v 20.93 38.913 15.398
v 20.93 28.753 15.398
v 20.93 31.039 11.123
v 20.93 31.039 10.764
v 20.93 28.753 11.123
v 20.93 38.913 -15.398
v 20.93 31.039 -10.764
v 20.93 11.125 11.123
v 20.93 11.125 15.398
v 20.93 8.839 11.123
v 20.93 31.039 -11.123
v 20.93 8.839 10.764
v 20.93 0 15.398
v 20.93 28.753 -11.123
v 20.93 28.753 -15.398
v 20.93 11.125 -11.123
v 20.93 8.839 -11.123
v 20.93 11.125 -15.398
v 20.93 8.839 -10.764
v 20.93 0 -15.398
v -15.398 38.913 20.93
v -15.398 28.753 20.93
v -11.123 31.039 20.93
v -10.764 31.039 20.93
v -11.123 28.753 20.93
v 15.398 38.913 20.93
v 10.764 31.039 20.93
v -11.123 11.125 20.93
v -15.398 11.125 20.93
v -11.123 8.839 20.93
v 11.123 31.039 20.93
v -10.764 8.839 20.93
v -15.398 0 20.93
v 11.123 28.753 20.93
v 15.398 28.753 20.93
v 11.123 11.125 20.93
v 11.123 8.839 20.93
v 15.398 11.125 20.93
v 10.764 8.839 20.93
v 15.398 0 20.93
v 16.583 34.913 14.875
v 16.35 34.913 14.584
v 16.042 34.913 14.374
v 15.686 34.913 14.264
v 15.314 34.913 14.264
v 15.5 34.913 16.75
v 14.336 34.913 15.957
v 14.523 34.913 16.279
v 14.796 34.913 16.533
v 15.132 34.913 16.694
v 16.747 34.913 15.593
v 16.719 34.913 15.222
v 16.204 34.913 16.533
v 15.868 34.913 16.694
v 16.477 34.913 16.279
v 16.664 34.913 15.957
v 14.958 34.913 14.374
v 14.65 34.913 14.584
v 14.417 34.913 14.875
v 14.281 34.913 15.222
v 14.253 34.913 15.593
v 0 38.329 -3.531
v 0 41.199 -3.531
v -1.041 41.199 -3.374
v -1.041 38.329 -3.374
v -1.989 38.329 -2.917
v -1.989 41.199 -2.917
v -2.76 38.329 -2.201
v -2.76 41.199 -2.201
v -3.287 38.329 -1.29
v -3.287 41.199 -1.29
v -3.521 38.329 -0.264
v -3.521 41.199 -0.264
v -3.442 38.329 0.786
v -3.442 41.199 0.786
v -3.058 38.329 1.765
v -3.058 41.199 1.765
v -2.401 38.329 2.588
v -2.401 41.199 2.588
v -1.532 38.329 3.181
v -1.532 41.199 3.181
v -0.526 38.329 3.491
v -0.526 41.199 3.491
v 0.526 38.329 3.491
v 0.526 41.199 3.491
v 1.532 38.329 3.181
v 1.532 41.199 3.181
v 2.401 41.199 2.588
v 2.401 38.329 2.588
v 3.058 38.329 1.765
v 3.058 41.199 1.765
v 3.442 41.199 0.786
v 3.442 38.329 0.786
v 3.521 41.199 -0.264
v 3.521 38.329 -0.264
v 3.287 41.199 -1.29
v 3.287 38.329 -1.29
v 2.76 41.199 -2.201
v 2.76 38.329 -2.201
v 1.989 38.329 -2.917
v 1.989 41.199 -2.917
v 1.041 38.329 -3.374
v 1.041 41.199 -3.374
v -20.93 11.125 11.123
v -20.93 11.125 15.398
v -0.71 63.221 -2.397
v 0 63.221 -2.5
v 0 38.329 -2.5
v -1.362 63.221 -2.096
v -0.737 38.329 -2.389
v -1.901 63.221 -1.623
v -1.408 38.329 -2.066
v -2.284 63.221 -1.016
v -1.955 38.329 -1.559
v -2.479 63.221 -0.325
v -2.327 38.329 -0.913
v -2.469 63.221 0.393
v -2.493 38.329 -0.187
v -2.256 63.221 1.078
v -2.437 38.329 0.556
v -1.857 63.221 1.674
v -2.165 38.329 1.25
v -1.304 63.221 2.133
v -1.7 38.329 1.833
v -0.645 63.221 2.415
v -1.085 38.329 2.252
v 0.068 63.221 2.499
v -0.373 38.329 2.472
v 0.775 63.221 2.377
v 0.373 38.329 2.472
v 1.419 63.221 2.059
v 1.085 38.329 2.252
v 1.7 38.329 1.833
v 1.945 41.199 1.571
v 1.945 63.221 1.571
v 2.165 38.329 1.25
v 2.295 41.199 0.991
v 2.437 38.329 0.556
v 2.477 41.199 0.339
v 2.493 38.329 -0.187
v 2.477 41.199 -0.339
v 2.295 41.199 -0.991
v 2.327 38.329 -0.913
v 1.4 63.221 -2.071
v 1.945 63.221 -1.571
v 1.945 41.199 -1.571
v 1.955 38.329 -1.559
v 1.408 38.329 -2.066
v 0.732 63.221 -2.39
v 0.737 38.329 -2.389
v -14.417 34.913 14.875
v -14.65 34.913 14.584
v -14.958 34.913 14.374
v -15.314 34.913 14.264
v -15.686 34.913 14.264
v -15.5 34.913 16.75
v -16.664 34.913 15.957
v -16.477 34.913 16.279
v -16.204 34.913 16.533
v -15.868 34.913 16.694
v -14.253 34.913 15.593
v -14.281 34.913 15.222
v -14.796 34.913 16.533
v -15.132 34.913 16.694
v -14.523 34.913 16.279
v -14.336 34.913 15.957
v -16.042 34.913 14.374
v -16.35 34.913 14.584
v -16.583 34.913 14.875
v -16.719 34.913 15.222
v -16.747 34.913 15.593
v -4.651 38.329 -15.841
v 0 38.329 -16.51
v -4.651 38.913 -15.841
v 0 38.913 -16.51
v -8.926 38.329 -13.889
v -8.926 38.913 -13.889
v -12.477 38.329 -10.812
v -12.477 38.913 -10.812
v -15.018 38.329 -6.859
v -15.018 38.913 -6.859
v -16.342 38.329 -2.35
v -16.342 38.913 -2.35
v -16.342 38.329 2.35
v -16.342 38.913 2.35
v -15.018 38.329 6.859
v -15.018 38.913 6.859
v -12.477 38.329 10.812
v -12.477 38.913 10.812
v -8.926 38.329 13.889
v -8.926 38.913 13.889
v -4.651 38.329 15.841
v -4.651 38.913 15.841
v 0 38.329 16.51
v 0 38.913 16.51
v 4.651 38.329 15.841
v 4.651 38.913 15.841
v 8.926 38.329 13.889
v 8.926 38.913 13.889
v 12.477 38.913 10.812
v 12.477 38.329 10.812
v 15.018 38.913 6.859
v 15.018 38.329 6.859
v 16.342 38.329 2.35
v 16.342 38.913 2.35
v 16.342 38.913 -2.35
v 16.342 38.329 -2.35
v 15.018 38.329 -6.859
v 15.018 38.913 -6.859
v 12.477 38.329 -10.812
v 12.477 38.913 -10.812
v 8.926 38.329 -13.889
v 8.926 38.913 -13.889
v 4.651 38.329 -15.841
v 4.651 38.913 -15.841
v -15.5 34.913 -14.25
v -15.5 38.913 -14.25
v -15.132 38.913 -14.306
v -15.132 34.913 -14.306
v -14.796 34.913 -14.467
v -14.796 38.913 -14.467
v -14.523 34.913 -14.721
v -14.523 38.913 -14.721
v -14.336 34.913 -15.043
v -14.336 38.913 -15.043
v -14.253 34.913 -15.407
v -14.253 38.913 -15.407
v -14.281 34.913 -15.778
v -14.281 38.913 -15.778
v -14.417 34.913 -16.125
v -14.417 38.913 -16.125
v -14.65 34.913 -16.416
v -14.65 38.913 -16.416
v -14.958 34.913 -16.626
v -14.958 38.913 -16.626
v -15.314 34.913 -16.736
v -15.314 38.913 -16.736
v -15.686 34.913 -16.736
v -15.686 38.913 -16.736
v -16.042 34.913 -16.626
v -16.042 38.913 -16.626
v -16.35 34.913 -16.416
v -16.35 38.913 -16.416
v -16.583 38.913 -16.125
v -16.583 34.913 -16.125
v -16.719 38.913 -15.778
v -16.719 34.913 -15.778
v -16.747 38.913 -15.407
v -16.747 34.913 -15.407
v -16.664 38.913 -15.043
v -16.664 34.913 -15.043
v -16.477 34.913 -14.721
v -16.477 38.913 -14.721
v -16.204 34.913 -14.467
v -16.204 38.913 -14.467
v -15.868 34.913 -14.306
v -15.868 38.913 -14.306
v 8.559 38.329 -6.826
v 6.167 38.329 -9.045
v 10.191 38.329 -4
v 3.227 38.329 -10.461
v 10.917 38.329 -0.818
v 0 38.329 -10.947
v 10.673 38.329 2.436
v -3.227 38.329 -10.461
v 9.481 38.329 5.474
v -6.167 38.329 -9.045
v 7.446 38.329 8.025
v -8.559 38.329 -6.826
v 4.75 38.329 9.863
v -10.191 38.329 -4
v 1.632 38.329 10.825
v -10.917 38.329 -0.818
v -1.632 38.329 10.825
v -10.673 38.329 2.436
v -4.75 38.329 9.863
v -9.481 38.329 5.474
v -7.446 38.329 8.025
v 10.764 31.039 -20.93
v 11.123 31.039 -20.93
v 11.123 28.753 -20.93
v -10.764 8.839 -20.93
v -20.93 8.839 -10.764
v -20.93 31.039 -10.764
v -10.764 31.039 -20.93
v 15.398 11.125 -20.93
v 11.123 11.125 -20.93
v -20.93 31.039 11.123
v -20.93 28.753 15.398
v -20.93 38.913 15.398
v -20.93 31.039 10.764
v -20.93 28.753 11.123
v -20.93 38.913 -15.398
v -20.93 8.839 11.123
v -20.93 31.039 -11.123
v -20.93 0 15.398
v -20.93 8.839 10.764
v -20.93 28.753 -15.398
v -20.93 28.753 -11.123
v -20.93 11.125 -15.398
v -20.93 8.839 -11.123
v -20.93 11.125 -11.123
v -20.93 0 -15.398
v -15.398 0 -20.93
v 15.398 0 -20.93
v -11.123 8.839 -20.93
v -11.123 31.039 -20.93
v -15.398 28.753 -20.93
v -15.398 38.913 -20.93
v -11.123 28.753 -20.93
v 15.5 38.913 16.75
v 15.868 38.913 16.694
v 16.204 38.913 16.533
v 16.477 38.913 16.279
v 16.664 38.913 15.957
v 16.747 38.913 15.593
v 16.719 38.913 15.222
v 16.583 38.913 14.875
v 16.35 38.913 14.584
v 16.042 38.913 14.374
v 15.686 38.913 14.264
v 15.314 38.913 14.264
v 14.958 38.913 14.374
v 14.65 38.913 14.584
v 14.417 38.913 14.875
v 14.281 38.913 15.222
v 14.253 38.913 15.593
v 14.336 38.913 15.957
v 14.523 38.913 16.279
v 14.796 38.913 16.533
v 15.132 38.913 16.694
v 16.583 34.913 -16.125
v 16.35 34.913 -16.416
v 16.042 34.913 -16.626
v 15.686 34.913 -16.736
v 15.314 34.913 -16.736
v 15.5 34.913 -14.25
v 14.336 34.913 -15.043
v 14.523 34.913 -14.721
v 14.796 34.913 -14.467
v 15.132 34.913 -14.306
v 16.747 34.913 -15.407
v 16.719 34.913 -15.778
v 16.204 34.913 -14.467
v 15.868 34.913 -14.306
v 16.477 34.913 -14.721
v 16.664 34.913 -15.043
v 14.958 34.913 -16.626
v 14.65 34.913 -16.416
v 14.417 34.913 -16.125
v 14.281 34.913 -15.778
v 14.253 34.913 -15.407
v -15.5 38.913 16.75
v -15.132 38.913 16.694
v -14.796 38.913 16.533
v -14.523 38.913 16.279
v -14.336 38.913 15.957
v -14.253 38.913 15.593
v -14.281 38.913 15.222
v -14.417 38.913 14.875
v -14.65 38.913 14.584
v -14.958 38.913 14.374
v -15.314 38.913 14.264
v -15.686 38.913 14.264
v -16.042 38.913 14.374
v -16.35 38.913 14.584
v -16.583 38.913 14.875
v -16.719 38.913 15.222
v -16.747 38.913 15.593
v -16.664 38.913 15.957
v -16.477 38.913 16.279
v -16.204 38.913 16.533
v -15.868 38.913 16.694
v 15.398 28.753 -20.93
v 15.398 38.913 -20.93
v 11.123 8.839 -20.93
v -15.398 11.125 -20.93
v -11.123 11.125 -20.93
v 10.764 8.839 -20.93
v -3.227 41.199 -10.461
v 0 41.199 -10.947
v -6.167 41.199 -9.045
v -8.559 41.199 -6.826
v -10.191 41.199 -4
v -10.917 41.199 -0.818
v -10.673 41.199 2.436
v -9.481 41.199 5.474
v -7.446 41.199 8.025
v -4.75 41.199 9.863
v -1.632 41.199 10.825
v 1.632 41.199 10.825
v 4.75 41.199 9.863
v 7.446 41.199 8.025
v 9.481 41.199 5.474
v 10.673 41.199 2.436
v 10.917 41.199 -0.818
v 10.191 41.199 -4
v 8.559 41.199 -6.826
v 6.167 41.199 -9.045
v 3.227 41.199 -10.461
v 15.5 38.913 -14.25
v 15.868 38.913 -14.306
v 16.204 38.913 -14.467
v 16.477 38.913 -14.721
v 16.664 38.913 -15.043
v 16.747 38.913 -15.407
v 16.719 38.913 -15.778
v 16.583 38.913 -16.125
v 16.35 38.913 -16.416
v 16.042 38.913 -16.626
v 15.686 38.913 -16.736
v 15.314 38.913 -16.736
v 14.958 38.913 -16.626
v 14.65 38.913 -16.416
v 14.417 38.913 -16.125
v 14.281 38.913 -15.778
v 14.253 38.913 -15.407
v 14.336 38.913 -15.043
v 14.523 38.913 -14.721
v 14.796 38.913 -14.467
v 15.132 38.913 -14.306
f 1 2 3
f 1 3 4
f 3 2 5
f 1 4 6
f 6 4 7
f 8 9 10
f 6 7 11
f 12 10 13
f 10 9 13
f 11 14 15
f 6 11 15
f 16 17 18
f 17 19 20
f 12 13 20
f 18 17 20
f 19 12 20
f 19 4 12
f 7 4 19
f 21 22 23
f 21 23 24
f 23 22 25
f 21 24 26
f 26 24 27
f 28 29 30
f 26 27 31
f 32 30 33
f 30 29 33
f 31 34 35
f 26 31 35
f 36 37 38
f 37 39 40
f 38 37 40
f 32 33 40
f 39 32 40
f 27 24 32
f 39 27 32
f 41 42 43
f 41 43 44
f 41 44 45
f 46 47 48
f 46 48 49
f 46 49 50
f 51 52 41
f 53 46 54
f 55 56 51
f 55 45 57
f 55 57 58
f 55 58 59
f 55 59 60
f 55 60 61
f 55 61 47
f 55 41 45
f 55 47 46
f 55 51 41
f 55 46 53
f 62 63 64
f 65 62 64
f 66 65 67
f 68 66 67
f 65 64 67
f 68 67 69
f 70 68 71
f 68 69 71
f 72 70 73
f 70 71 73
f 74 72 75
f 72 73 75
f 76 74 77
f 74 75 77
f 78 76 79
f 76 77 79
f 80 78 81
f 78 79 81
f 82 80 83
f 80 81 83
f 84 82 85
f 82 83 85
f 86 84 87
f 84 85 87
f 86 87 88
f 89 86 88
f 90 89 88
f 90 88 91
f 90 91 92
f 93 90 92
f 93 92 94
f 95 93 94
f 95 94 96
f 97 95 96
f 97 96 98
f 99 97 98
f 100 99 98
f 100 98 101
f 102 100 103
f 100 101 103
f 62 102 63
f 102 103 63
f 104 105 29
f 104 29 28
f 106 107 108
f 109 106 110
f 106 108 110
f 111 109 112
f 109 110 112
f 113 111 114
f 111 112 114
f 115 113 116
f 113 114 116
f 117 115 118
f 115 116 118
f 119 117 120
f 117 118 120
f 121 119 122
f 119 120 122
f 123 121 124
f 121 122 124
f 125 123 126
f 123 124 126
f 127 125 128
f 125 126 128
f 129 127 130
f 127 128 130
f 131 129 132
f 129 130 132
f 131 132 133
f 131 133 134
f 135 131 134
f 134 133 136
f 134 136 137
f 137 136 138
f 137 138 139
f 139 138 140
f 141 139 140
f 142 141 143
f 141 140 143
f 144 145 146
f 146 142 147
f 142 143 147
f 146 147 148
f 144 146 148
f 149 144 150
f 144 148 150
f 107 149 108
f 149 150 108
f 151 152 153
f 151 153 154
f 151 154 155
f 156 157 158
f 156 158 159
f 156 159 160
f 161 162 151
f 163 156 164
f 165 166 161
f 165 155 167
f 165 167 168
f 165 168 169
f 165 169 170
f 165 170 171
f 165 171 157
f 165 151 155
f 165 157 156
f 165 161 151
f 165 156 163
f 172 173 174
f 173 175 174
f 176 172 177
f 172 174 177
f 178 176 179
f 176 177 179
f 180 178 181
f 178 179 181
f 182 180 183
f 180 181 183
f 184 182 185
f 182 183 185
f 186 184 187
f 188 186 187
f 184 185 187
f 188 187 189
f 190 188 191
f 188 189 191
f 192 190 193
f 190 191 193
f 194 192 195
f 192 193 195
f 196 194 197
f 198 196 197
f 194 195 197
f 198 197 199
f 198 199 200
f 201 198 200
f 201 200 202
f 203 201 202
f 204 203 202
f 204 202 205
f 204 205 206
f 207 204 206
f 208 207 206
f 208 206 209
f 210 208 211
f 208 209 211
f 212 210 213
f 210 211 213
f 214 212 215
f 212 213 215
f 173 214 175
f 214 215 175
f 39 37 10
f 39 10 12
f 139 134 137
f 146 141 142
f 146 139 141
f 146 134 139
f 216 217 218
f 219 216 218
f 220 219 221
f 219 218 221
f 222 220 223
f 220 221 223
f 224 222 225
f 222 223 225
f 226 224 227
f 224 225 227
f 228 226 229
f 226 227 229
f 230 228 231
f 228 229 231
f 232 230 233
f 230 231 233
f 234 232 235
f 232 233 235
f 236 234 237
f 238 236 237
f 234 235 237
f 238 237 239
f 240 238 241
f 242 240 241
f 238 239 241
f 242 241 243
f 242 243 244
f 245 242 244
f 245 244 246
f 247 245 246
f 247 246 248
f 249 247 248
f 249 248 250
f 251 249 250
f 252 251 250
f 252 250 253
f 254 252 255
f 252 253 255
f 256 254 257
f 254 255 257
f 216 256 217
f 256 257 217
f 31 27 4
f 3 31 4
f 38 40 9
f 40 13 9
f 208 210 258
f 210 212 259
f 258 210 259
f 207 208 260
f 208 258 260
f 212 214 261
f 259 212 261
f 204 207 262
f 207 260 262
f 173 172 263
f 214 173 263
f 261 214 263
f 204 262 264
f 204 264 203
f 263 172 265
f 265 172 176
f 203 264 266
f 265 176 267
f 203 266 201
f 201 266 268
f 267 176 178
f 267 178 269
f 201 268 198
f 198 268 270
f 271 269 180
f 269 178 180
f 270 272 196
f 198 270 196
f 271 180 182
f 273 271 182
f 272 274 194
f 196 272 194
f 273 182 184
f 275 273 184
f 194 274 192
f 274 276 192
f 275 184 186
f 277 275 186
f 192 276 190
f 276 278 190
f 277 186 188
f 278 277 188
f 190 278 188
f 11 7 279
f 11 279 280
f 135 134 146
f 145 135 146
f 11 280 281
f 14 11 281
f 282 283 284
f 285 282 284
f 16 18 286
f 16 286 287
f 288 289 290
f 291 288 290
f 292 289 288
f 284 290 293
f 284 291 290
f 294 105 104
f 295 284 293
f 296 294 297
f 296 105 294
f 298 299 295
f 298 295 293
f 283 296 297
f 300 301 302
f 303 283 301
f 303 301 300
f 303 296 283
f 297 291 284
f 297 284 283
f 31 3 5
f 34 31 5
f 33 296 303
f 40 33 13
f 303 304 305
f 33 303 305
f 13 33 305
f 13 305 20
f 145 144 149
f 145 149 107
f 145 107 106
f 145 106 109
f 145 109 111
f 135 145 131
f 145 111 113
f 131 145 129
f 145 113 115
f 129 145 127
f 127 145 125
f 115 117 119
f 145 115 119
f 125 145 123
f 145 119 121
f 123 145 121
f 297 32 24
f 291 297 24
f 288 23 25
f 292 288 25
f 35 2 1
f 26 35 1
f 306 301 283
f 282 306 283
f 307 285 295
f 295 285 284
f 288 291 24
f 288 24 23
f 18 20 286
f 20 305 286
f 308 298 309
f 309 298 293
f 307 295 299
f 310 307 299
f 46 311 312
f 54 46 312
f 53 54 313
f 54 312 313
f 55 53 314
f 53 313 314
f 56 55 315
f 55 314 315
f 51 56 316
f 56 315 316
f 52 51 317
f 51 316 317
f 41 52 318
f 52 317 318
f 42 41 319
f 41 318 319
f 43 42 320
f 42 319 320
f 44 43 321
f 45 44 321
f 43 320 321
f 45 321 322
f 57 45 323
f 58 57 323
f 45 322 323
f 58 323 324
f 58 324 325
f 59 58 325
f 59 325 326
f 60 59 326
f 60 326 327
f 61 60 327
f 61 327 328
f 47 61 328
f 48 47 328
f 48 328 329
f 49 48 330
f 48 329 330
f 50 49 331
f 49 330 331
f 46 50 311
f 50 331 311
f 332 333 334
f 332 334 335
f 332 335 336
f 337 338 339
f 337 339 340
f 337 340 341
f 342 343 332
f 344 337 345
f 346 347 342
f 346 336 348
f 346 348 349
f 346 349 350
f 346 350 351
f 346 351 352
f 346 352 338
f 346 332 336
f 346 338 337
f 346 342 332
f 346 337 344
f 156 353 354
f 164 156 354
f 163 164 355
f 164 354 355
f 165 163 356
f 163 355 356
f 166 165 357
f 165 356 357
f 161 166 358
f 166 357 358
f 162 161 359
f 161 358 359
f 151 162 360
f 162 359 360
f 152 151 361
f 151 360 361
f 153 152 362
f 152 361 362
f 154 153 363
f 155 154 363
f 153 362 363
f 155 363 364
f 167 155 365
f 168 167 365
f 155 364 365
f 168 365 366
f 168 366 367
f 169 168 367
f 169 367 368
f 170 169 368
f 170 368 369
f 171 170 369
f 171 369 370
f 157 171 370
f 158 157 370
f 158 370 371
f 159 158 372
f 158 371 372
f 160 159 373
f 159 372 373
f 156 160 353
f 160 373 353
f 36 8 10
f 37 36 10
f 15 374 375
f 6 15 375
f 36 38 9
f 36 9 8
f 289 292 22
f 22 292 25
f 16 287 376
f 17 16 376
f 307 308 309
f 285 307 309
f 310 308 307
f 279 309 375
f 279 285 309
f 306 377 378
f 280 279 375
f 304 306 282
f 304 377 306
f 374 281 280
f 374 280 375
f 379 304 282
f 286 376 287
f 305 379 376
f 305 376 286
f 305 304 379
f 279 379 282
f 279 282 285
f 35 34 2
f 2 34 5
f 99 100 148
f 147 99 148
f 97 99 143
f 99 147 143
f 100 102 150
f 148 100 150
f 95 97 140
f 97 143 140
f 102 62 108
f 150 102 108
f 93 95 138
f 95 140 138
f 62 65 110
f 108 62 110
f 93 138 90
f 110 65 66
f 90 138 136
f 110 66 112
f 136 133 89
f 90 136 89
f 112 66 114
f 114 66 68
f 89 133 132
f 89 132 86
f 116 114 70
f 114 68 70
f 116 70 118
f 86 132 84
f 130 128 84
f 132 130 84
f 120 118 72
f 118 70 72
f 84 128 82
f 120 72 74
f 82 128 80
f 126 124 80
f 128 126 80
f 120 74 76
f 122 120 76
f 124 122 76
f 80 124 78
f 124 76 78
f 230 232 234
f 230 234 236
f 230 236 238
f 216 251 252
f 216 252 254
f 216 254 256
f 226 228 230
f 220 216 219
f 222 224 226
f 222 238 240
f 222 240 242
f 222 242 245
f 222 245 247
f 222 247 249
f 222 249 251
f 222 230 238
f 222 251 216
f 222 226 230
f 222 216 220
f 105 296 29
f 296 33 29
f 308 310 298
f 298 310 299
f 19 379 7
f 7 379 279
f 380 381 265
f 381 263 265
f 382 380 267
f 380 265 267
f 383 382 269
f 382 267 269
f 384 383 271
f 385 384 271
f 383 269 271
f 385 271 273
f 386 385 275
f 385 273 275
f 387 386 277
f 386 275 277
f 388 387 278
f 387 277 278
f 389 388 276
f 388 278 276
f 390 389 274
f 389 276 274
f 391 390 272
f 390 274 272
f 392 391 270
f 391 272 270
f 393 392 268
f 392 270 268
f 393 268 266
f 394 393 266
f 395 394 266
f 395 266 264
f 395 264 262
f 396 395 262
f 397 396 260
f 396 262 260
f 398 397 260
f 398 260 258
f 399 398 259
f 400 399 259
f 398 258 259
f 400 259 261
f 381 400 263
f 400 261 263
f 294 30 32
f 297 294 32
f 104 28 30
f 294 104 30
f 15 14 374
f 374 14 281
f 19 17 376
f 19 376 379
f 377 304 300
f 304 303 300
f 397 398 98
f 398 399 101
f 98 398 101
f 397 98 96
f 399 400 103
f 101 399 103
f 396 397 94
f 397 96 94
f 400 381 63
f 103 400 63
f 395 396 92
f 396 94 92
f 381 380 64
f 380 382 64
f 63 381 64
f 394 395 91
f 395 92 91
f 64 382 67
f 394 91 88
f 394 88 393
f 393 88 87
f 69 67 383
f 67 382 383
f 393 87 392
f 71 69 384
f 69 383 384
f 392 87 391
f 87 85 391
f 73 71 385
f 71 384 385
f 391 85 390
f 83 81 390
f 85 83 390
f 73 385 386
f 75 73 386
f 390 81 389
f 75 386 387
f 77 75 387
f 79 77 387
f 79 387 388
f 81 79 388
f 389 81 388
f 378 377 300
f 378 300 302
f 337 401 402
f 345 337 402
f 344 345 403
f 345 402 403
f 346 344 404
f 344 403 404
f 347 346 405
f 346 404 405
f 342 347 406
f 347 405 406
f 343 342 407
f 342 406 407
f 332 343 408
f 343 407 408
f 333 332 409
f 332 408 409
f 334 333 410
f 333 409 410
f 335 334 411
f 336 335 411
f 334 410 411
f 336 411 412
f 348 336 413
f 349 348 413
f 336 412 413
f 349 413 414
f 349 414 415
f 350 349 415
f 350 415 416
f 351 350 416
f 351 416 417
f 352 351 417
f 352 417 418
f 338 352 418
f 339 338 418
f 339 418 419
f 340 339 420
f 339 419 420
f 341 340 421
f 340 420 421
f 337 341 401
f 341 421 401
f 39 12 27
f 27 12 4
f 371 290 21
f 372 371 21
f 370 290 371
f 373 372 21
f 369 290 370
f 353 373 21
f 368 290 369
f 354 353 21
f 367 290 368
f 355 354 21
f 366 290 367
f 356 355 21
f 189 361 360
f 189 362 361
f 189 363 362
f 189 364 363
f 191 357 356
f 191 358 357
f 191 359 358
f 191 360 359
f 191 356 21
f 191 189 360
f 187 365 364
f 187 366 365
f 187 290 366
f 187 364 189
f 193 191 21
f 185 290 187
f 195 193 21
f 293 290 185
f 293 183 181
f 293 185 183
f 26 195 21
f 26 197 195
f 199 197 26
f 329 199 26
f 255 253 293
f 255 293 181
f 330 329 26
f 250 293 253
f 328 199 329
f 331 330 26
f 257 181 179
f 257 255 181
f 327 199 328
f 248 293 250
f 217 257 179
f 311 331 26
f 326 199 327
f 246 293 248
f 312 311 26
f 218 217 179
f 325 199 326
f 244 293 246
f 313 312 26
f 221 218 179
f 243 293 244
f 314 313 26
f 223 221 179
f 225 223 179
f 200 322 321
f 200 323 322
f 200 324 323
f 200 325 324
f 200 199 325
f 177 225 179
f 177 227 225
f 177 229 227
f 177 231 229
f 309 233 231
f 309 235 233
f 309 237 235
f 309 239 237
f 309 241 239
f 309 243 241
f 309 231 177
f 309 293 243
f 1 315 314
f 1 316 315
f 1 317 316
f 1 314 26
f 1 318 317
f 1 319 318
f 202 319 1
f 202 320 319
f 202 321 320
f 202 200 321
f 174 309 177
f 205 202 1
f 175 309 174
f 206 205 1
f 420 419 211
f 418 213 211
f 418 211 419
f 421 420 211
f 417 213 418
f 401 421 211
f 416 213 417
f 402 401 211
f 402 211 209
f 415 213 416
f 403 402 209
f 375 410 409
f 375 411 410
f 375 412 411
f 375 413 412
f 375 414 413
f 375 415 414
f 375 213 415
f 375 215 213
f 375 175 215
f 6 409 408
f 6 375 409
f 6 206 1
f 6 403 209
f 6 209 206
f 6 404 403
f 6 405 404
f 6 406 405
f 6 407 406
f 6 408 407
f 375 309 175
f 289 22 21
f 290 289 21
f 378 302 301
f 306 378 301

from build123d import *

# Parameters (mm, degrees)
SKETCH3_W           = 6.441091569
SKETCH3_H           = 9.606110701
CUT_EXTRUDE1_DEPTH  = 22.0218
SKETCH4_W           = 41.8592
SKETCH4_H           = 41.8592
SKETCH4_R           = 18.3896
BOSS_EXTRUDE1_DEPTH = 38.9128
CUT_EXTRUDE2_DEPTH  = 70.806450824
CIRPATTERN1_COUNT   = 4
SKETCH10_R          = 1.25
CUT_EXTRUDE3_DEPTH  = 4


with BuildPart() as part:
    # Sketch2 → Revolve1 (revolve)
    with BuildSketch(Plane.XY, mode=Mode.PRIVATE) as revolve1_sk:
        Polygon((0, 0), (0, 63.2206), (2.5, 63.2206), (2.5, 38.3286), (3.5306, 38.3286), (3.5306, 41.1988), (10.9474, 41.1988), (10.9474, 38.3286), (16.51, 38.3286), (16.51, 38.9128), (20.9296, 38.9128), (20.9296, 0), align=None)
    revolve(revolve1_sk.sketch.rotate(Axis((0, 0, 0), (0, 1, 0)), 90), axis=Axis((0, 0, 0), (0, 1, 0)))

    # Sketch3 → Cut-Extrude1 (cut)
    with BuildSketch(Plane(origin=(0, 63.2206, 0), x_dir=(1, 0, 0), z_dir=(0, 1, 0))):
        with Locations((5.165545785, 1.138296355)):
            Rectangle(SKETCH3_W, SKETCH3_H)
    extrude(amount=-CUT_EXTRUDE1_DEPTH, mode=Mode.SUBTRACT)

    # Sketch4 → Boss-Extrude1 (add)
    with BuildSketch(Plane(origin=(0, 0, 0), x_dir=(1, 0, 0), z_dir=(0, 1, 0))):
        Rectangle(SKETCH4_W, SKETCH4_H)
        Circle(SKETCH4_R, mode=Mode.SUBTRACT)
    extrude(amount=BOSS_EXTRUDE1_DEPTH)

    # Sketch5 → Cut-Extrude2 (cut, symmetric)
    with BuildSketch(Plane(origin=(0, 0, 0), x_dir=(0, 1, 0), z_dir=(0.7071067811865488, 0, 0.7071067811865464))):
        Polygon((0, 25.687324175), (11.1252, 25.687324175), (11.1252, 22.664724175), (8.8392, 22.664724175), (8.8392, 22.410724175), (11.1252, 22.410724175), (28.7528, 22.410724175), (31.0388, 22.410724175), (31.0388, 22.664724175), (28.7528, 22.664724175), (28.7528, 25.687324175), (38.9128, 25.687324175), (48.436079104, 25.687324175), (48.436079104, 38.399610954), (-11.393232354, 38.399610954), (-11.393232354, 25.687324175), align=None)
    cut_extrude2 = extrude(amount=CUT_EXTRUDE2_DEPTH, both=True, mode=Mode.SUBTRACT)

    # CirPattern1: Cut-Extrude2 ×4 about axis
    cirpattern1_axis = Axis((0, 0, 0), (0, 1, 0))
    for i in range(1, CIRPATTERN1_COUNT):
        add(cut_extrude2.rotate(cirpattern1_axis, i * 360 / CIRPATTERN1_COUNT), mode=Mode.SUBTRACT)

    # Sketch10 → Cut-Extrude3 (cut)
    with BuildSketch(Plane(origin=(0, 38.9128, 0), x_dir=(1, 0, 0), z_dir=(0, 1, 0))):
        with Locations(Location((-15.5, 15.5, 0), (0, 0, 270))):
            Circle(SKETCH10_R)
        with Locations(Location((15.5, 15.5, 0), (0, 0, 270))):
            Circle(SKETCH10_R)
        with Locations(Location((15.5, -15.5, 0), (0, 0, 270))):
            Circle(SKETCH10_R)
        with Locations(Location((-15.5, -15.5, 0), (0, 0, 270))):
            Circle(SKETCH10_R)
    extrude(amount=-CUT_EXTRUDE3_DEPTH, mode=Mode.SUBTRACT)


solid = part.part
